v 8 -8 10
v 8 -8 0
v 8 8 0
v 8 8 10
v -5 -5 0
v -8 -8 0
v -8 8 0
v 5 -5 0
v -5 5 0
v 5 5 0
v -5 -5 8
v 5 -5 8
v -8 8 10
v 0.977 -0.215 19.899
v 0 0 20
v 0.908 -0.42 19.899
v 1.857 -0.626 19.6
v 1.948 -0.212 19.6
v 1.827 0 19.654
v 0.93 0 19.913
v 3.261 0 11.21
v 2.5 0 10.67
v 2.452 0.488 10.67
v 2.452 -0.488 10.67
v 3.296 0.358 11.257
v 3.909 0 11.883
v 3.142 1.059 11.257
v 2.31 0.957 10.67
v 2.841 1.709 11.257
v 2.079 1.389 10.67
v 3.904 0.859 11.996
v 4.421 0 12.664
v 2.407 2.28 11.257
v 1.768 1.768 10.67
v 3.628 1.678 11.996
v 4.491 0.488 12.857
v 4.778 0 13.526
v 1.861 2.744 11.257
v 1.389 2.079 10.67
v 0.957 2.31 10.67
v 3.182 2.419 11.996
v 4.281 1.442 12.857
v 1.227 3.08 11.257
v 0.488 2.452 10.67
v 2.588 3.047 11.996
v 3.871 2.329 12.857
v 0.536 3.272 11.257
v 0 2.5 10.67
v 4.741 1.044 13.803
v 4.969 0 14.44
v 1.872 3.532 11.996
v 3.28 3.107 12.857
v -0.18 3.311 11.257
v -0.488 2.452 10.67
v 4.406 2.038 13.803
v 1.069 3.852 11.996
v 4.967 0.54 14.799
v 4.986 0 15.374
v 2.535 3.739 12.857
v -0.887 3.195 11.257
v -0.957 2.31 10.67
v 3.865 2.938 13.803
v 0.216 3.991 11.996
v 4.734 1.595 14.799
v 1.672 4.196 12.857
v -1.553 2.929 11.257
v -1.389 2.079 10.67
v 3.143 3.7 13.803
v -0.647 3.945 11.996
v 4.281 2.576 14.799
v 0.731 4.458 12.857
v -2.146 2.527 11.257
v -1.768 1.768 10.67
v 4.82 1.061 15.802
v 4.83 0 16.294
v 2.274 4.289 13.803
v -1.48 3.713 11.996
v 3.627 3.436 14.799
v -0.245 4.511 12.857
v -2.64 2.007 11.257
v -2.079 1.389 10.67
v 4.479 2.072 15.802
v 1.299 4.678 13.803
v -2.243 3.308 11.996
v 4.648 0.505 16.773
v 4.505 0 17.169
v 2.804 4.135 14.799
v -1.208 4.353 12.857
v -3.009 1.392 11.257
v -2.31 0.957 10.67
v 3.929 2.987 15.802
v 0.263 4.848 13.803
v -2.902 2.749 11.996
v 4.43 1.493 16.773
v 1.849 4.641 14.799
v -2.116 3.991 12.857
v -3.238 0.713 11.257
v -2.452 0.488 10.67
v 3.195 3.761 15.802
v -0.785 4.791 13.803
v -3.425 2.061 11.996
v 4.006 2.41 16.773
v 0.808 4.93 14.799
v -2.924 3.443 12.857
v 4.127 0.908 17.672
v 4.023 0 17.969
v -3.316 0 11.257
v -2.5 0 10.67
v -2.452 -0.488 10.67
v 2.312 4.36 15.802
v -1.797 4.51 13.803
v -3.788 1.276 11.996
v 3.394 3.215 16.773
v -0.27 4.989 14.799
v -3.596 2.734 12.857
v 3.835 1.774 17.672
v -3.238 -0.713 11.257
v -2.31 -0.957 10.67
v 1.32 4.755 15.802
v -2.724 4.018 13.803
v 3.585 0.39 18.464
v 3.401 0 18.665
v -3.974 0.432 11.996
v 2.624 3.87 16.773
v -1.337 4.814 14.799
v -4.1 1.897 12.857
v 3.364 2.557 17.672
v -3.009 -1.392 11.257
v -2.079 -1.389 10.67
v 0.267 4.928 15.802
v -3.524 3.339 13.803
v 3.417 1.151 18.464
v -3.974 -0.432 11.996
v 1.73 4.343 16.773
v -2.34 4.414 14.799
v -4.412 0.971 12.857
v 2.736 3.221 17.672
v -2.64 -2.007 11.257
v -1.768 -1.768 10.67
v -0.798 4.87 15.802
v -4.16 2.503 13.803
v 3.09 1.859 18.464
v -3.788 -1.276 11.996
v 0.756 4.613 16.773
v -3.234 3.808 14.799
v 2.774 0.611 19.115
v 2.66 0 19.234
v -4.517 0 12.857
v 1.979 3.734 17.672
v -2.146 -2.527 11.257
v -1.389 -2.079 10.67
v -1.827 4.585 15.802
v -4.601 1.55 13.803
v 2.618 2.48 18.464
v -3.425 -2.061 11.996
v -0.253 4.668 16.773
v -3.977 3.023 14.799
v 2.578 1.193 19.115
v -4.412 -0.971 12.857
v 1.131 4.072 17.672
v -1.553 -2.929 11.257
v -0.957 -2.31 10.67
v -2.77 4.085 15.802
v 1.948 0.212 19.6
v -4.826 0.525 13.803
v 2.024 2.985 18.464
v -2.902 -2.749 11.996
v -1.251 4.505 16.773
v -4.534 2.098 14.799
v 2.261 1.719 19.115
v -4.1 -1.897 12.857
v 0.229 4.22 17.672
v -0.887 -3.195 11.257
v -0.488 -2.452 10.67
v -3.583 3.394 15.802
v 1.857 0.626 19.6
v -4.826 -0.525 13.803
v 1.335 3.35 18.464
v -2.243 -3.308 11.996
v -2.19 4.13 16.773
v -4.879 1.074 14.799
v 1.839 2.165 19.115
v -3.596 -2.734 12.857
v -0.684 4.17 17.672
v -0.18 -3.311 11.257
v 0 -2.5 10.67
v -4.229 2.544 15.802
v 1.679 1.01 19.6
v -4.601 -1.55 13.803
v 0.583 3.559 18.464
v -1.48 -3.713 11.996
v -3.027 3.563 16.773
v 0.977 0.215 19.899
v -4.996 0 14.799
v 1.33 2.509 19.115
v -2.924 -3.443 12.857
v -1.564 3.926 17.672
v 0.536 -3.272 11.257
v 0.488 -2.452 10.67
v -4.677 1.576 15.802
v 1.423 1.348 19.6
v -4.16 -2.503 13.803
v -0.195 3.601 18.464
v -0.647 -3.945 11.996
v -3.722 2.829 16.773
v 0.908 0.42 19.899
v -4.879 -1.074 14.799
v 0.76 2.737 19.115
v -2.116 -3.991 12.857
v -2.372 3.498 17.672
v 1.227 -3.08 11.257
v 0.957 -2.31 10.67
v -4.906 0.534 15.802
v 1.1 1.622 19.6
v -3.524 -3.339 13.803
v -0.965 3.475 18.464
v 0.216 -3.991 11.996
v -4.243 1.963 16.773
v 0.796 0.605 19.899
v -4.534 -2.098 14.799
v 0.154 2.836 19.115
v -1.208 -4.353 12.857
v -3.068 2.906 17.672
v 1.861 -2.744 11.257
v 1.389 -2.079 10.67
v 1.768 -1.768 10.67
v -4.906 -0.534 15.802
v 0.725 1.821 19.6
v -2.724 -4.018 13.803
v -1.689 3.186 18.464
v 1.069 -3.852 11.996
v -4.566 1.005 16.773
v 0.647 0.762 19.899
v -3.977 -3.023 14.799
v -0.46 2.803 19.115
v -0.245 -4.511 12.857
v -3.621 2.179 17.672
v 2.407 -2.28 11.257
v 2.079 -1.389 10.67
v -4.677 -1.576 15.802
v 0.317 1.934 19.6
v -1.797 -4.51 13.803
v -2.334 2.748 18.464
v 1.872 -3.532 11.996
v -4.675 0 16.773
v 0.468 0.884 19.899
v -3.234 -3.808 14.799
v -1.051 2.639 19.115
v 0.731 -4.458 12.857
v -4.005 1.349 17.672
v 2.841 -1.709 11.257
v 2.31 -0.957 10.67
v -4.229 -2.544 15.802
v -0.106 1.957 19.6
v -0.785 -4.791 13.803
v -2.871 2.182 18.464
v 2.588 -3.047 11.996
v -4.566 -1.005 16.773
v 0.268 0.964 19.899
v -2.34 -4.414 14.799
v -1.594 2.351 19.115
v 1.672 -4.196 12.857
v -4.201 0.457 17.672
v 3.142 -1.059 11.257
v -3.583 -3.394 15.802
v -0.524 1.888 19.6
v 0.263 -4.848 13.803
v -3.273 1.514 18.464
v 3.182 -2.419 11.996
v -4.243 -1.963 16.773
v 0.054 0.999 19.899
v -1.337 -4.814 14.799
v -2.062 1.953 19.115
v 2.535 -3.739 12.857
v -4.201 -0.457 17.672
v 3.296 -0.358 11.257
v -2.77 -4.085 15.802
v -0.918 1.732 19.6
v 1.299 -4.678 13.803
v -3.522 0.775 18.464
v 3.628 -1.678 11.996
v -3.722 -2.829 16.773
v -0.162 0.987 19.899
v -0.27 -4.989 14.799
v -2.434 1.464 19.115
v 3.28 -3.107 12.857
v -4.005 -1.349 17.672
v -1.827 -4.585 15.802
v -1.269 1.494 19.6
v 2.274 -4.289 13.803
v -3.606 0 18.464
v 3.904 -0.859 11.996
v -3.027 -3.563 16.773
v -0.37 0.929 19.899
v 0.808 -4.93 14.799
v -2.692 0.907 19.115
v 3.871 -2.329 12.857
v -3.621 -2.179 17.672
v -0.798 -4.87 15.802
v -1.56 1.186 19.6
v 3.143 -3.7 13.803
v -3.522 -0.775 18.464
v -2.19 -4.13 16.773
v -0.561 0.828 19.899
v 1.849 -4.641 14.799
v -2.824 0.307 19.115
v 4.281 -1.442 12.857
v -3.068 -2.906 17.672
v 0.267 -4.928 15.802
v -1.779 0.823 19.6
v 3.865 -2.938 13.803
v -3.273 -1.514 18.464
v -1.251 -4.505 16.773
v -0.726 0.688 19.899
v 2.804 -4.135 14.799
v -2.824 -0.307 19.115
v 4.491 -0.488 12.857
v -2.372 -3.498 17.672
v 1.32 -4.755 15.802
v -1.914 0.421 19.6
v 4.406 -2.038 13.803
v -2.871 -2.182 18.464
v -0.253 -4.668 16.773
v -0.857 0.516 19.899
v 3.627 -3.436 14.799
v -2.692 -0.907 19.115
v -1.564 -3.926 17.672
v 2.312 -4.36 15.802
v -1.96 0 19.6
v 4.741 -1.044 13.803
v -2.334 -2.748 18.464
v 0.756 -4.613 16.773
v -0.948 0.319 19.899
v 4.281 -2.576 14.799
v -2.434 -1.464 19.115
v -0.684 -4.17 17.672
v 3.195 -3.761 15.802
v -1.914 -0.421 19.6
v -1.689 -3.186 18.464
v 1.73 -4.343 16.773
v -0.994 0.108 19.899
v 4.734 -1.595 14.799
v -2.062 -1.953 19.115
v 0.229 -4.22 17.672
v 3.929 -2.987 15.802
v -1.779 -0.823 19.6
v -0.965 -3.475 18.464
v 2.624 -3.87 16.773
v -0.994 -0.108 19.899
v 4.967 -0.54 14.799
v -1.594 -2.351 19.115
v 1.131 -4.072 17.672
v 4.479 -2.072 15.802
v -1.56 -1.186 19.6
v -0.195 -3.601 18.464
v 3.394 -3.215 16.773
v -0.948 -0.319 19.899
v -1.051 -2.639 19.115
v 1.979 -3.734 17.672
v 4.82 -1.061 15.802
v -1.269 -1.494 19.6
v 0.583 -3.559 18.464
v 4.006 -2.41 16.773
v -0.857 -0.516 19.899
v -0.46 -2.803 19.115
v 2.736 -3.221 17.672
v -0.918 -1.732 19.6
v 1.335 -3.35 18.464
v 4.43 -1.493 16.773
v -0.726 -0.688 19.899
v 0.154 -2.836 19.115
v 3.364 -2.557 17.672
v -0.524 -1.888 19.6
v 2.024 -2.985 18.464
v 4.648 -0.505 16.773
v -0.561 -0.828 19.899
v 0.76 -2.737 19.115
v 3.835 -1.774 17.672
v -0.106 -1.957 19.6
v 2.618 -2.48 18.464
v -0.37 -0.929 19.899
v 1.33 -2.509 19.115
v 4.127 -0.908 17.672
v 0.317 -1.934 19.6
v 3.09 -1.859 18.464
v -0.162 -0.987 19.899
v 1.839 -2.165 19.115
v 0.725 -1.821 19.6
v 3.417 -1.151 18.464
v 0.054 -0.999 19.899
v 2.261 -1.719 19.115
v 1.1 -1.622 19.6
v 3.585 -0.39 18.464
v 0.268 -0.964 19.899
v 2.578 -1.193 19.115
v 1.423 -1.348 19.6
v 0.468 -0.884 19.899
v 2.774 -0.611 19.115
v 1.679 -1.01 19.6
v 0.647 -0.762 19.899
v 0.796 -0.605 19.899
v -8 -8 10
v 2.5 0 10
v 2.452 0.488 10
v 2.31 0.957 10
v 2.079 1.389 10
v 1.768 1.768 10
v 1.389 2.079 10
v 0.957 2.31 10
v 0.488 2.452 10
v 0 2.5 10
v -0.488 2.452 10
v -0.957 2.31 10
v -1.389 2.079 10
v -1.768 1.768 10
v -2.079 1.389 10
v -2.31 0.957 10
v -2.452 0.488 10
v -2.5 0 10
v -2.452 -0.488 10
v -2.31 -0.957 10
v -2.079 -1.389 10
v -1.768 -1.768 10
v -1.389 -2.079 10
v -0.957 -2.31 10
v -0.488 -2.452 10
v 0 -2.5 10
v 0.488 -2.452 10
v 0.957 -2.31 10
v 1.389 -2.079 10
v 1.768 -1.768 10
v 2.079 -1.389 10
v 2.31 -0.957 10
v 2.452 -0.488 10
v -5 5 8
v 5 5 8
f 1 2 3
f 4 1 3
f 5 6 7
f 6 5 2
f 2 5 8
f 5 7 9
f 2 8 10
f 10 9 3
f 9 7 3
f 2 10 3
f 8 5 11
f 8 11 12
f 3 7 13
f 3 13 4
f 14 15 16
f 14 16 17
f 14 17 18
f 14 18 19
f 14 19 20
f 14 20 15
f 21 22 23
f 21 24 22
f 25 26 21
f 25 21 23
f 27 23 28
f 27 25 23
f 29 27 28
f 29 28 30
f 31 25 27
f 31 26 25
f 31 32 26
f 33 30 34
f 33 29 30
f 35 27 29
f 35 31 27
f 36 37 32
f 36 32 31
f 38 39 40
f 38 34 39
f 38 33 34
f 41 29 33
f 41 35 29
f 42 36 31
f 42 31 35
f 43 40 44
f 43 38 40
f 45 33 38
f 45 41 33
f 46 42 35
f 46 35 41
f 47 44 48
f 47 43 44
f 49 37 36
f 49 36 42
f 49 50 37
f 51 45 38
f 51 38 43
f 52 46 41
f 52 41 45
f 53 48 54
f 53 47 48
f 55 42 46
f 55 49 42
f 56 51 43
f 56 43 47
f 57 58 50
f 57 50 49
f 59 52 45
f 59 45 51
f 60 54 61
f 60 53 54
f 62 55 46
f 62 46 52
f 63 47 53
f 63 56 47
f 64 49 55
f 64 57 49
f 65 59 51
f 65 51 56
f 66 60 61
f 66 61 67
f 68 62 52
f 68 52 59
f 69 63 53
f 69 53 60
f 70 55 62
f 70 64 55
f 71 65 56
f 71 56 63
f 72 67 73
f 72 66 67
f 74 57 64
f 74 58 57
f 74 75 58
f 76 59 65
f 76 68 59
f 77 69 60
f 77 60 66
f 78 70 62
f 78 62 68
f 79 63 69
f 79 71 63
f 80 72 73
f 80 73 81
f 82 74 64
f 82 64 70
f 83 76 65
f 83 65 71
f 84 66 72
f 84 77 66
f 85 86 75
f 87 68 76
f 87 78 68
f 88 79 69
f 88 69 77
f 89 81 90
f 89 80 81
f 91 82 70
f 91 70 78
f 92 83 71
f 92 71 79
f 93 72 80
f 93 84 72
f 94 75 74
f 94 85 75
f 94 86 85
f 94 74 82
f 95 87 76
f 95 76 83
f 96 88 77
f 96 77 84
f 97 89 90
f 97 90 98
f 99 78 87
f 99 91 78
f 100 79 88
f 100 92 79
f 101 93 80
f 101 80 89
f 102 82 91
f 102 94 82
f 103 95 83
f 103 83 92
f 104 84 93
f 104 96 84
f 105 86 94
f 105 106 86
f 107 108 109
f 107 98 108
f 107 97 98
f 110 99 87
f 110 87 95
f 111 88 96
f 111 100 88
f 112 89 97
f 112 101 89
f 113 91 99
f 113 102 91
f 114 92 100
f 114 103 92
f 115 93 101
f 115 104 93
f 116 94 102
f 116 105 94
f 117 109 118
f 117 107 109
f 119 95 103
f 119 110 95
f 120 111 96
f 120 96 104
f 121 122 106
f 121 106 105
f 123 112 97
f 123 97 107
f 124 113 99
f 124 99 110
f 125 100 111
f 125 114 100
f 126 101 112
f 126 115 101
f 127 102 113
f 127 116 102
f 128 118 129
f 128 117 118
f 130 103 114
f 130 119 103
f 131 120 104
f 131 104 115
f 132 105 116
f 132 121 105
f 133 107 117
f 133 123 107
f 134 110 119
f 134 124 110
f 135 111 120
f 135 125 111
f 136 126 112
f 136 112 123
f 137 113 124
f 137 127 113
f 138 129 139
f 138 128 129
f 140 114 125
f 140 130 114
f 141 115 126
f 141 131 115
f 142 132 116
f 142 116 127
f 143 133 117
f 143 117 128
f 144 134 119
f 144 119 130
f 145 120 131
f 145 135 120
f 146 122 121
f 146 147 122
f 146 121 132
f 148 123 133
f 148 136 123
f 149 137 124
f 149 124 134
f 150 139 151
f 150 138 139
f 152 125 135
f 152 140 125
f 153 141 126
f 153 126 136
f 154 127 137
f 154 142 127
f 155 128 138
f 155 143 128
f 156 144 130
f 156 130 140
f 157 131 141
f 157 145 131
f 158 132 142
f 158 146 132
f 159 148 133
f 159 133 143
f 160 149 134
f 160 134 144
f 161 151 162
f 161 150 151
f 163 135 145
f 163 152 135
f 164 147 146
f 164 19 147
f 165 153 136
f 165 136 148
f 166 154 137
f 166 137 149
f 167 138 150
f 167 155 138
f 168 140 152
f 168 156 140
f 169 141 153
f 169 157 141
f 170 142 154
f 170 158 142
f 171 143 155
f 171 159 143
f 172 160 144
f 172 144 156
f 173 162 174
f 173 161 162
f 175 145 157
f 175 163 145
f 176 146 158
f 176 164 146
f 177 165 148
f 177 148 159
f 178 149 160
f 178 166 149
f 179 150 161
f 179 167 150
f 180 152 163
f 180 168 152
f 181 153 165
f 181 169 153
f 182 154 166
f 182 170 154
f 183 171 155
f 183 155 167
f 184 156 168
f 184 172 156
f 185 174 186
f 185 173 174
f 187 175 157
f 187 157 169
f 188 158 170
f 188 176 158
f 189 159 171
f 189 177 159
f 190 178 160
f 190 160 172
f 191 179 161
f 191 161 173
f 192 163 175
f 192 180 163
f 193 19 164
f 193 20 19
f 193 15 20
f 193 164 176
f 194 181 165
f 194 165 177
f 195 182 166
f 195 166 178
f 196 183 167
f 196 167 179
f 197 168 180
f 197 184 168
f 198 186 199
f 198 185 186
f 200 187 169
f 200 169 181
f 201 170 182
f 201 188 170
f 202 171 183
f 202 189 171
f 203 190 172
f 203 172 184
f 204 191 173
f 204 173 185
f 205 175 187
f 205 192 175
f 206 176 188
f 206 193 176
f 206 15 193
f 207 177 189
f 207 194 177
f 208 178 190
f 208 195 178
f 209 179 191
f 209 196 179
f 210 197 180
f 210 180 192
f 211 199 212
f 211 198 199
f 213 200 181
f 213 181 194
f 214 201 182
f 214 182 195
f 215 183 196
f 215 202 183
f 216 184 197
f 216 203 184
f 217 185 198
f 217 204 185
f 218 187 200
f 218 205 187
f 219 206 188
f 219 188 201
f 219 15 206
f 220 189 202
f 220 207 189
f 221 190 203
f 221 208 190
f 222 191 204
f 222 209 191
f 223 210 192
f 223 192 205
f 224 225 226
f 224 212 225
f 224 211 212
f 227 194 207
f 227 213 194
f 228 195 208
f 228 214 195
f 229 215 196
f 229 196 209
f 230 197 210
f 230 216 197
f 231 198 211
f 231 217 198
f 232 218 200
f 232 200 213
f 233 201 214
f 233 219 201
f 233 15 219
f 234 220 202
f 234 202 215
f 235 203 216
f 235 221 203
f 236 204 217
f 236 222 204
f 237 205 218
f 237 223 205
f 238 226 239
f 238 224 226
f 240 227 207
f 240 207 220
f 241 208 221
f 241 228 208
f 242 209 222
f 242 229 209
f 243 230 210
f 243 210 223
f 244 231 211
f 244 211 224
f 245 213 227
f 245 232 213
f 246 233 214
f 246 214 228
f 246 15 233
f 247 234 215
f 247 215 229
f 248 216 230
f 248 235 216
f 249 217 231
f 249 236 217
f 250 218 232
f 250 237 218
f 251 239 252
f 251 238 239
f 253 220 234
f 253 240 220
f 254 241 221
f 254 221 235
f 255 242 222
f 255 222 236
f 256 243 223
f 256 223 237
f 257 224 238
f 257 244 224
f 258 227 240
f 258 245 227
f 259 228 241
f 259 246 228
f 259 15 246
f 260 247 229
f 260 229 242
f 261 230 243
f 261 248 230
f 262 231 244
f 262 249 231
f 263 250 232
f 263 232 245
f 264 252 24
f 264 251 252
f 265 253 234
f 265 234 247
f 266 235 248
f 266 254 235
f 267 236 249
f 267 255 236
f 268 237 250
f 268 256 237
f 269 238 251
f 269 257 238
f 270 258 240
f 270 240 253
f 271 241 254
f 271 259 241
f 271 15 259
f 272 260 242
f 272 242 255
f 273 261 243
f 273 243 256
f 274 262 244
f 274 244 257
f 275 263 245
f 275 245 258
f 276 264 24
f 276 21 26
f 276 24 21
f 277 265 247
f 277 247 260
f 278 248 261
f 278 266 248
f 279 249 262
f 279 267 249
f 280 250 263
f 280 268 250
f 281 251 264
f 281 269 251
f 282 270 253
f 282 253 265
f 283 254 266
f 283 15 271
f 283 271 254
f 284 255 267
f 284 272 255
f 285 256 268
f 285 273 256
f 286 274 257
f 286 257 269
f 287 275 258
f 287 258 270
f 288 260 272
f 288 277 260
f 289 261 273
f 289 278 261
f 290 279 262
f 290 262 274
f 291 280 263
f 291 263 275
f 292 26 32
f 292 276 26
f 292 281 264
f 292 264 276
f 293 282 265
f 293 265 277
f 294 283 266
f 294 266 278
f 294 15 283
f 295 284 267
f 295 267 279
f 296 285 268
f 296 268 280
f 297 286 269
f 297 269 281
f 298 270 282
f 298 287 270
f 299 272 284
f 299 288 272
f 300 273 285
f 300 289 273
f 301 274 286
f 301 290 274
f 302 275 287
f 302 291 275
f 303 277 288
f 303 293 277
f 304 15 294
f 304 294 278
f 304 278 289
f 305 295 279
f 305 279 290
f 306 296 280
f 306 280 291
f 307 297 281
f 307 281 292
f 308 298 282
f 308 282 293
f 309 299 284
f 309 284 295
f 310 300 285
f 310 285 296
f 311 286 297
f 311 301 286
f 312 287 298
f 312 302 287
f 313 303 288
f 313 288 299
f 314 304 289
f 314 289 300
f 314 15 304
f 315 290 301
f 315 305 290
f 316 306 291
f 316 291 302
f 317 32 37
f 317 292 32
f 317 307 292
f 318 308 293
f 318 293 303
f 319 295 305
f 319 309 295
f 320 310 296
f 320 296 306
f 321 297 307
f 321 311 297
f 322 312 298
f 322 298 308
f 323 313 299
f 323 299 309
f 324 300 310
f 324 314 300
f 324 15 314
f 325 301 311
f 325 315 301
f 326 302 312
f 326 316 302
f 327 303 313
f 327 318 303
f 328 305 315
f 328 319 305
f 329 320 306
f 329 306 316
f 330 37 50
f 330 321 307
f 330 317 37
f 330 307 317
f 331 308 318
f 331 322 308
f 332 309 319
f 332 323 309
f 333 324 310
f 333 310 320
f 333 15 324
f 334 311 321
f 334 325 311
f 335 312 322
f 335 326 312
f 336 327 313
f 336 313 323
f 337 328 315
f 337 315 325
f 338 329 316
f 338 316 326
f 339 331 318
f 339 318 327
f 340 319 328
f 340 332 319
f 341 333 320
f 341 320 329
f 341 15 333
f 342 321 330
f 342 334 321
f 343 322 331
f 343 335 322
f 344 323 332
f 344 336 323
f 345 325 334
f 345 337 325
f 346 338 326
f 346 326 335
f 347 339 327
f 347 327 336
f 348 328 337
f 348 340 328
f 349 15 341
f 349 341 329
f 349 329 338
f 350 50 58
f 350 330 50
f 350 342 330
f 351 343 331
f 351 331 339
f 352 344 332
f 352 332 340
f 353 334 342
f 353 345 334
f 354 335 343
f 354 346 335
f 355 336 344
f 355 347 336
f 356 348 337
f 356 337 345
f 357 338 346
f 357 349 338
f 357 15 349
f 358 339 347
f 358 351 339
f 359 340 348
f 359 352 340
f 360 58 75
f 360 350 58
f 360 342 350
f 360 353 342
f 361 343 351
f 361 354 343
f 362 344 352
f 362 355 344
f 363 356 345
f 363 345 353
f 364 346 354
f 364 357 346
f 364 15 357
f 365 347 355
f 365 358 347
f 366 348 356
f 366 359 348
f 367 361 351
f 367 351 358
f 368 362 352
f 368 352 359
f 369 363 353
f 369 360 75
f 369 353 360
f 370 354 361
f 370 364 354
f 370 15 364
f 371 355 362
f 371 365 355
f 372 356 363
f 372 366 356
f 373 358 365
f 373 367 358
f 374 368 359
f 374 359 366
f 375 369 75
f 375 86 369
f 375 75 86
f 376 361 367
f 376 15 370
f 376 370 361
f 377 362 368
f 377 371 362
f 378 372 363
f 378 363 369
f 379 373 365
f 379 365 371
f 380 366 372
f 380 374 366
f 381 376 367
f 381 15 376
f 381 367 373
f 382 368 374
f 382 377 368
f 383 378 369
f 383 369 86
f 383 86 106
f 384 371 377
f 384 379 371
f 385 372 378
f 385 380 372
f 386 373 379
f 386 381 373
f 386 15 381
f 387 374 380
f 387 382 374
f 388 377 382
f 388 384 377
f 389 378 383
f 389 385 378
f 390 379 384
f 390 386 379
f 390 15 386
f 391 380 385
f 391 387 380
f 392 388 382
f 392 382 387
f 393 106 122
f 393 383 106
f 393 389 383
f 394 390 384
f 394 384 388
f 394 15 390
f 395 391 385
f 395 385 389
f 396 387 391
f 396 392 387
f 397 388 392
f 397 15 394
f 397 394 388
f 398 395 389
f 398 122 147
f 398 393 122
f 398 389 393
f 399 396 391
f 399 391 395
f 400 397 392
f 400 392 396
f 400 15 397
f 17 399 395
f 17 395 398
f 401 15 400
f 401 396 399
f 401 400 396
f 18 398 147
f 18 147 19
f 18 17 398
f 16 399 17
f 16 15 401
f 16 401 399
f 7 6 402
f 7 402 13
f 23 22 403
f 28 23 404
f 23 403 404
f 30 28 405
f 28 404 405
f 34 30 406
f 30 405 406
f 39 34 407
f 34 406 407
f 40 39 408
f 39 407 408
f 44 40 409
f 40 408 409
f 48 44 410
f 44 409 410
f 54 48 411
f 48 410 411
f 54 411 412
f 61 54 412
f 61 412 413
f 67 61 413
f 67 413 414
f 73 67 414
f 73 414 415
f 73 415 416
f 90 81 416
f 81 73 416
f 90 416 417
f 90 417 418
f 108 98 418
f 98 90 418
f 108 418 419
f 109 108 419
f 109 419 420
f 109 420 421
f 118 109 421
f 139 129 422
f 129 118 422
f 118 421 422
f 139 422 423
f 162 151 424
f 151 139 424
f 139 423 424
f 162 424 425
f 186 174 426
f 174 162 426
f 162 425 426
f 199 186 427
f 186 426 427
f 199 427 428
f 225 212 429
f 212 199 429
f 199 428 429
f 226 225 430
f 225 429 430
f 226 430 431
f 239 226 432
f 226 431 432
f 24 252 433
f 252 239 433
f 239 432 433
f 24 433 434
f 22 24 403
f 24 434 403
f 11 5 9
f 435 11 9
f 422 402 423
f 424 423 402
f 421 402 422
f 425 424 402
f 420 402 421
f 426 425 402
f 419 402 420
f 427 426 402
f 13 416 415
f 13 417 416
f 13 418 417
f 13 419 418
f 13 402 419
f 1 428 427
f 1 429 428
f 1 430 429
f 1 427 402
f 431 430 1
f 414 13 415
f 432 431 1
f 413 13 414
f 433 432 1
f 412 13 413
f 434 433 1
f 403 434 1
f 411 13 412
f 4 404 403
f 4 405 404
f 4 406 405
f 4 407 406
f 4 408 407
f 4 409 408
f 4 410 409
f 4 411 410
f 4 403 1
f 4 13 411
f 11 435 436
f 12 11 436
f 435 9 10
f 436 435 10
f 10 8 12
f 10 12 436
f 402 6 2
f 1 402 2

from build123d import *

# Parameters (mm, degrees)
BOX001_W       = 10
BOX001_H       = 10
BOX001_DEPTH   = 8
CYLINDER_R     = 2.5
CYLINDER_DEPTH = 5
BOX_W          = 16
BOX_H          = 16
BOX_DEPTH      = 10


with BuildPart() as cube001:
    # Box001 → Box001 (new body)
    with BuildSketch(Plane(origin=(-5, -5, 0), x_dir=(1, 0, 0), z_dir=(0, 0, 1))):
        with Locations((5, 5)):
            Rectangle(BOX001_W, BOX001_H)
    extrude(amount=BOX001_DEPTH)


with BuildPart() as cylinder:
    # Cylinder → Cylinder (new body)
    with BuildSketch(Plane.XY.offset(10)):
        Circle(CYLINDER_R)
    extrude(amount=CYLINDER_DEPTH)


with BuildPart() as sphere:
    # Sphere → Sphere (revolve)
    with BuildSketch(Plane(origin=(0, 0, 15), x_dir=(1, 0, 0), z_dir=(0, -1, 0))):
        with BuildLine():
            ThreePointArc((0, -5), (5, 0), (0, 5))
            Line((0, 5), (0, -5))
        make_face()
    revolve(axis=Axis((0, 0, 15), (0, 0, 1)))


with BuildPart() as cut:
    # Box → Box (new body)
    with BuildSketch(Plane(origin=(-8, -8, 0), x_dir=(1, 0, 0), z_dir=(0, 0, 1))):
        with Locations((8, 8)):
            Rectangle(BOX_W, BOX_H)
    extrude(amount=BOX_DEPTH)

    # Fusion: union Cylinder, Sphere
    add(cylinder.part)
    add(sphere.part)

    # Cut: cut Cube001
    add(cube001.part, mode=Mode.SUBTRACT)


solid = cut.part
